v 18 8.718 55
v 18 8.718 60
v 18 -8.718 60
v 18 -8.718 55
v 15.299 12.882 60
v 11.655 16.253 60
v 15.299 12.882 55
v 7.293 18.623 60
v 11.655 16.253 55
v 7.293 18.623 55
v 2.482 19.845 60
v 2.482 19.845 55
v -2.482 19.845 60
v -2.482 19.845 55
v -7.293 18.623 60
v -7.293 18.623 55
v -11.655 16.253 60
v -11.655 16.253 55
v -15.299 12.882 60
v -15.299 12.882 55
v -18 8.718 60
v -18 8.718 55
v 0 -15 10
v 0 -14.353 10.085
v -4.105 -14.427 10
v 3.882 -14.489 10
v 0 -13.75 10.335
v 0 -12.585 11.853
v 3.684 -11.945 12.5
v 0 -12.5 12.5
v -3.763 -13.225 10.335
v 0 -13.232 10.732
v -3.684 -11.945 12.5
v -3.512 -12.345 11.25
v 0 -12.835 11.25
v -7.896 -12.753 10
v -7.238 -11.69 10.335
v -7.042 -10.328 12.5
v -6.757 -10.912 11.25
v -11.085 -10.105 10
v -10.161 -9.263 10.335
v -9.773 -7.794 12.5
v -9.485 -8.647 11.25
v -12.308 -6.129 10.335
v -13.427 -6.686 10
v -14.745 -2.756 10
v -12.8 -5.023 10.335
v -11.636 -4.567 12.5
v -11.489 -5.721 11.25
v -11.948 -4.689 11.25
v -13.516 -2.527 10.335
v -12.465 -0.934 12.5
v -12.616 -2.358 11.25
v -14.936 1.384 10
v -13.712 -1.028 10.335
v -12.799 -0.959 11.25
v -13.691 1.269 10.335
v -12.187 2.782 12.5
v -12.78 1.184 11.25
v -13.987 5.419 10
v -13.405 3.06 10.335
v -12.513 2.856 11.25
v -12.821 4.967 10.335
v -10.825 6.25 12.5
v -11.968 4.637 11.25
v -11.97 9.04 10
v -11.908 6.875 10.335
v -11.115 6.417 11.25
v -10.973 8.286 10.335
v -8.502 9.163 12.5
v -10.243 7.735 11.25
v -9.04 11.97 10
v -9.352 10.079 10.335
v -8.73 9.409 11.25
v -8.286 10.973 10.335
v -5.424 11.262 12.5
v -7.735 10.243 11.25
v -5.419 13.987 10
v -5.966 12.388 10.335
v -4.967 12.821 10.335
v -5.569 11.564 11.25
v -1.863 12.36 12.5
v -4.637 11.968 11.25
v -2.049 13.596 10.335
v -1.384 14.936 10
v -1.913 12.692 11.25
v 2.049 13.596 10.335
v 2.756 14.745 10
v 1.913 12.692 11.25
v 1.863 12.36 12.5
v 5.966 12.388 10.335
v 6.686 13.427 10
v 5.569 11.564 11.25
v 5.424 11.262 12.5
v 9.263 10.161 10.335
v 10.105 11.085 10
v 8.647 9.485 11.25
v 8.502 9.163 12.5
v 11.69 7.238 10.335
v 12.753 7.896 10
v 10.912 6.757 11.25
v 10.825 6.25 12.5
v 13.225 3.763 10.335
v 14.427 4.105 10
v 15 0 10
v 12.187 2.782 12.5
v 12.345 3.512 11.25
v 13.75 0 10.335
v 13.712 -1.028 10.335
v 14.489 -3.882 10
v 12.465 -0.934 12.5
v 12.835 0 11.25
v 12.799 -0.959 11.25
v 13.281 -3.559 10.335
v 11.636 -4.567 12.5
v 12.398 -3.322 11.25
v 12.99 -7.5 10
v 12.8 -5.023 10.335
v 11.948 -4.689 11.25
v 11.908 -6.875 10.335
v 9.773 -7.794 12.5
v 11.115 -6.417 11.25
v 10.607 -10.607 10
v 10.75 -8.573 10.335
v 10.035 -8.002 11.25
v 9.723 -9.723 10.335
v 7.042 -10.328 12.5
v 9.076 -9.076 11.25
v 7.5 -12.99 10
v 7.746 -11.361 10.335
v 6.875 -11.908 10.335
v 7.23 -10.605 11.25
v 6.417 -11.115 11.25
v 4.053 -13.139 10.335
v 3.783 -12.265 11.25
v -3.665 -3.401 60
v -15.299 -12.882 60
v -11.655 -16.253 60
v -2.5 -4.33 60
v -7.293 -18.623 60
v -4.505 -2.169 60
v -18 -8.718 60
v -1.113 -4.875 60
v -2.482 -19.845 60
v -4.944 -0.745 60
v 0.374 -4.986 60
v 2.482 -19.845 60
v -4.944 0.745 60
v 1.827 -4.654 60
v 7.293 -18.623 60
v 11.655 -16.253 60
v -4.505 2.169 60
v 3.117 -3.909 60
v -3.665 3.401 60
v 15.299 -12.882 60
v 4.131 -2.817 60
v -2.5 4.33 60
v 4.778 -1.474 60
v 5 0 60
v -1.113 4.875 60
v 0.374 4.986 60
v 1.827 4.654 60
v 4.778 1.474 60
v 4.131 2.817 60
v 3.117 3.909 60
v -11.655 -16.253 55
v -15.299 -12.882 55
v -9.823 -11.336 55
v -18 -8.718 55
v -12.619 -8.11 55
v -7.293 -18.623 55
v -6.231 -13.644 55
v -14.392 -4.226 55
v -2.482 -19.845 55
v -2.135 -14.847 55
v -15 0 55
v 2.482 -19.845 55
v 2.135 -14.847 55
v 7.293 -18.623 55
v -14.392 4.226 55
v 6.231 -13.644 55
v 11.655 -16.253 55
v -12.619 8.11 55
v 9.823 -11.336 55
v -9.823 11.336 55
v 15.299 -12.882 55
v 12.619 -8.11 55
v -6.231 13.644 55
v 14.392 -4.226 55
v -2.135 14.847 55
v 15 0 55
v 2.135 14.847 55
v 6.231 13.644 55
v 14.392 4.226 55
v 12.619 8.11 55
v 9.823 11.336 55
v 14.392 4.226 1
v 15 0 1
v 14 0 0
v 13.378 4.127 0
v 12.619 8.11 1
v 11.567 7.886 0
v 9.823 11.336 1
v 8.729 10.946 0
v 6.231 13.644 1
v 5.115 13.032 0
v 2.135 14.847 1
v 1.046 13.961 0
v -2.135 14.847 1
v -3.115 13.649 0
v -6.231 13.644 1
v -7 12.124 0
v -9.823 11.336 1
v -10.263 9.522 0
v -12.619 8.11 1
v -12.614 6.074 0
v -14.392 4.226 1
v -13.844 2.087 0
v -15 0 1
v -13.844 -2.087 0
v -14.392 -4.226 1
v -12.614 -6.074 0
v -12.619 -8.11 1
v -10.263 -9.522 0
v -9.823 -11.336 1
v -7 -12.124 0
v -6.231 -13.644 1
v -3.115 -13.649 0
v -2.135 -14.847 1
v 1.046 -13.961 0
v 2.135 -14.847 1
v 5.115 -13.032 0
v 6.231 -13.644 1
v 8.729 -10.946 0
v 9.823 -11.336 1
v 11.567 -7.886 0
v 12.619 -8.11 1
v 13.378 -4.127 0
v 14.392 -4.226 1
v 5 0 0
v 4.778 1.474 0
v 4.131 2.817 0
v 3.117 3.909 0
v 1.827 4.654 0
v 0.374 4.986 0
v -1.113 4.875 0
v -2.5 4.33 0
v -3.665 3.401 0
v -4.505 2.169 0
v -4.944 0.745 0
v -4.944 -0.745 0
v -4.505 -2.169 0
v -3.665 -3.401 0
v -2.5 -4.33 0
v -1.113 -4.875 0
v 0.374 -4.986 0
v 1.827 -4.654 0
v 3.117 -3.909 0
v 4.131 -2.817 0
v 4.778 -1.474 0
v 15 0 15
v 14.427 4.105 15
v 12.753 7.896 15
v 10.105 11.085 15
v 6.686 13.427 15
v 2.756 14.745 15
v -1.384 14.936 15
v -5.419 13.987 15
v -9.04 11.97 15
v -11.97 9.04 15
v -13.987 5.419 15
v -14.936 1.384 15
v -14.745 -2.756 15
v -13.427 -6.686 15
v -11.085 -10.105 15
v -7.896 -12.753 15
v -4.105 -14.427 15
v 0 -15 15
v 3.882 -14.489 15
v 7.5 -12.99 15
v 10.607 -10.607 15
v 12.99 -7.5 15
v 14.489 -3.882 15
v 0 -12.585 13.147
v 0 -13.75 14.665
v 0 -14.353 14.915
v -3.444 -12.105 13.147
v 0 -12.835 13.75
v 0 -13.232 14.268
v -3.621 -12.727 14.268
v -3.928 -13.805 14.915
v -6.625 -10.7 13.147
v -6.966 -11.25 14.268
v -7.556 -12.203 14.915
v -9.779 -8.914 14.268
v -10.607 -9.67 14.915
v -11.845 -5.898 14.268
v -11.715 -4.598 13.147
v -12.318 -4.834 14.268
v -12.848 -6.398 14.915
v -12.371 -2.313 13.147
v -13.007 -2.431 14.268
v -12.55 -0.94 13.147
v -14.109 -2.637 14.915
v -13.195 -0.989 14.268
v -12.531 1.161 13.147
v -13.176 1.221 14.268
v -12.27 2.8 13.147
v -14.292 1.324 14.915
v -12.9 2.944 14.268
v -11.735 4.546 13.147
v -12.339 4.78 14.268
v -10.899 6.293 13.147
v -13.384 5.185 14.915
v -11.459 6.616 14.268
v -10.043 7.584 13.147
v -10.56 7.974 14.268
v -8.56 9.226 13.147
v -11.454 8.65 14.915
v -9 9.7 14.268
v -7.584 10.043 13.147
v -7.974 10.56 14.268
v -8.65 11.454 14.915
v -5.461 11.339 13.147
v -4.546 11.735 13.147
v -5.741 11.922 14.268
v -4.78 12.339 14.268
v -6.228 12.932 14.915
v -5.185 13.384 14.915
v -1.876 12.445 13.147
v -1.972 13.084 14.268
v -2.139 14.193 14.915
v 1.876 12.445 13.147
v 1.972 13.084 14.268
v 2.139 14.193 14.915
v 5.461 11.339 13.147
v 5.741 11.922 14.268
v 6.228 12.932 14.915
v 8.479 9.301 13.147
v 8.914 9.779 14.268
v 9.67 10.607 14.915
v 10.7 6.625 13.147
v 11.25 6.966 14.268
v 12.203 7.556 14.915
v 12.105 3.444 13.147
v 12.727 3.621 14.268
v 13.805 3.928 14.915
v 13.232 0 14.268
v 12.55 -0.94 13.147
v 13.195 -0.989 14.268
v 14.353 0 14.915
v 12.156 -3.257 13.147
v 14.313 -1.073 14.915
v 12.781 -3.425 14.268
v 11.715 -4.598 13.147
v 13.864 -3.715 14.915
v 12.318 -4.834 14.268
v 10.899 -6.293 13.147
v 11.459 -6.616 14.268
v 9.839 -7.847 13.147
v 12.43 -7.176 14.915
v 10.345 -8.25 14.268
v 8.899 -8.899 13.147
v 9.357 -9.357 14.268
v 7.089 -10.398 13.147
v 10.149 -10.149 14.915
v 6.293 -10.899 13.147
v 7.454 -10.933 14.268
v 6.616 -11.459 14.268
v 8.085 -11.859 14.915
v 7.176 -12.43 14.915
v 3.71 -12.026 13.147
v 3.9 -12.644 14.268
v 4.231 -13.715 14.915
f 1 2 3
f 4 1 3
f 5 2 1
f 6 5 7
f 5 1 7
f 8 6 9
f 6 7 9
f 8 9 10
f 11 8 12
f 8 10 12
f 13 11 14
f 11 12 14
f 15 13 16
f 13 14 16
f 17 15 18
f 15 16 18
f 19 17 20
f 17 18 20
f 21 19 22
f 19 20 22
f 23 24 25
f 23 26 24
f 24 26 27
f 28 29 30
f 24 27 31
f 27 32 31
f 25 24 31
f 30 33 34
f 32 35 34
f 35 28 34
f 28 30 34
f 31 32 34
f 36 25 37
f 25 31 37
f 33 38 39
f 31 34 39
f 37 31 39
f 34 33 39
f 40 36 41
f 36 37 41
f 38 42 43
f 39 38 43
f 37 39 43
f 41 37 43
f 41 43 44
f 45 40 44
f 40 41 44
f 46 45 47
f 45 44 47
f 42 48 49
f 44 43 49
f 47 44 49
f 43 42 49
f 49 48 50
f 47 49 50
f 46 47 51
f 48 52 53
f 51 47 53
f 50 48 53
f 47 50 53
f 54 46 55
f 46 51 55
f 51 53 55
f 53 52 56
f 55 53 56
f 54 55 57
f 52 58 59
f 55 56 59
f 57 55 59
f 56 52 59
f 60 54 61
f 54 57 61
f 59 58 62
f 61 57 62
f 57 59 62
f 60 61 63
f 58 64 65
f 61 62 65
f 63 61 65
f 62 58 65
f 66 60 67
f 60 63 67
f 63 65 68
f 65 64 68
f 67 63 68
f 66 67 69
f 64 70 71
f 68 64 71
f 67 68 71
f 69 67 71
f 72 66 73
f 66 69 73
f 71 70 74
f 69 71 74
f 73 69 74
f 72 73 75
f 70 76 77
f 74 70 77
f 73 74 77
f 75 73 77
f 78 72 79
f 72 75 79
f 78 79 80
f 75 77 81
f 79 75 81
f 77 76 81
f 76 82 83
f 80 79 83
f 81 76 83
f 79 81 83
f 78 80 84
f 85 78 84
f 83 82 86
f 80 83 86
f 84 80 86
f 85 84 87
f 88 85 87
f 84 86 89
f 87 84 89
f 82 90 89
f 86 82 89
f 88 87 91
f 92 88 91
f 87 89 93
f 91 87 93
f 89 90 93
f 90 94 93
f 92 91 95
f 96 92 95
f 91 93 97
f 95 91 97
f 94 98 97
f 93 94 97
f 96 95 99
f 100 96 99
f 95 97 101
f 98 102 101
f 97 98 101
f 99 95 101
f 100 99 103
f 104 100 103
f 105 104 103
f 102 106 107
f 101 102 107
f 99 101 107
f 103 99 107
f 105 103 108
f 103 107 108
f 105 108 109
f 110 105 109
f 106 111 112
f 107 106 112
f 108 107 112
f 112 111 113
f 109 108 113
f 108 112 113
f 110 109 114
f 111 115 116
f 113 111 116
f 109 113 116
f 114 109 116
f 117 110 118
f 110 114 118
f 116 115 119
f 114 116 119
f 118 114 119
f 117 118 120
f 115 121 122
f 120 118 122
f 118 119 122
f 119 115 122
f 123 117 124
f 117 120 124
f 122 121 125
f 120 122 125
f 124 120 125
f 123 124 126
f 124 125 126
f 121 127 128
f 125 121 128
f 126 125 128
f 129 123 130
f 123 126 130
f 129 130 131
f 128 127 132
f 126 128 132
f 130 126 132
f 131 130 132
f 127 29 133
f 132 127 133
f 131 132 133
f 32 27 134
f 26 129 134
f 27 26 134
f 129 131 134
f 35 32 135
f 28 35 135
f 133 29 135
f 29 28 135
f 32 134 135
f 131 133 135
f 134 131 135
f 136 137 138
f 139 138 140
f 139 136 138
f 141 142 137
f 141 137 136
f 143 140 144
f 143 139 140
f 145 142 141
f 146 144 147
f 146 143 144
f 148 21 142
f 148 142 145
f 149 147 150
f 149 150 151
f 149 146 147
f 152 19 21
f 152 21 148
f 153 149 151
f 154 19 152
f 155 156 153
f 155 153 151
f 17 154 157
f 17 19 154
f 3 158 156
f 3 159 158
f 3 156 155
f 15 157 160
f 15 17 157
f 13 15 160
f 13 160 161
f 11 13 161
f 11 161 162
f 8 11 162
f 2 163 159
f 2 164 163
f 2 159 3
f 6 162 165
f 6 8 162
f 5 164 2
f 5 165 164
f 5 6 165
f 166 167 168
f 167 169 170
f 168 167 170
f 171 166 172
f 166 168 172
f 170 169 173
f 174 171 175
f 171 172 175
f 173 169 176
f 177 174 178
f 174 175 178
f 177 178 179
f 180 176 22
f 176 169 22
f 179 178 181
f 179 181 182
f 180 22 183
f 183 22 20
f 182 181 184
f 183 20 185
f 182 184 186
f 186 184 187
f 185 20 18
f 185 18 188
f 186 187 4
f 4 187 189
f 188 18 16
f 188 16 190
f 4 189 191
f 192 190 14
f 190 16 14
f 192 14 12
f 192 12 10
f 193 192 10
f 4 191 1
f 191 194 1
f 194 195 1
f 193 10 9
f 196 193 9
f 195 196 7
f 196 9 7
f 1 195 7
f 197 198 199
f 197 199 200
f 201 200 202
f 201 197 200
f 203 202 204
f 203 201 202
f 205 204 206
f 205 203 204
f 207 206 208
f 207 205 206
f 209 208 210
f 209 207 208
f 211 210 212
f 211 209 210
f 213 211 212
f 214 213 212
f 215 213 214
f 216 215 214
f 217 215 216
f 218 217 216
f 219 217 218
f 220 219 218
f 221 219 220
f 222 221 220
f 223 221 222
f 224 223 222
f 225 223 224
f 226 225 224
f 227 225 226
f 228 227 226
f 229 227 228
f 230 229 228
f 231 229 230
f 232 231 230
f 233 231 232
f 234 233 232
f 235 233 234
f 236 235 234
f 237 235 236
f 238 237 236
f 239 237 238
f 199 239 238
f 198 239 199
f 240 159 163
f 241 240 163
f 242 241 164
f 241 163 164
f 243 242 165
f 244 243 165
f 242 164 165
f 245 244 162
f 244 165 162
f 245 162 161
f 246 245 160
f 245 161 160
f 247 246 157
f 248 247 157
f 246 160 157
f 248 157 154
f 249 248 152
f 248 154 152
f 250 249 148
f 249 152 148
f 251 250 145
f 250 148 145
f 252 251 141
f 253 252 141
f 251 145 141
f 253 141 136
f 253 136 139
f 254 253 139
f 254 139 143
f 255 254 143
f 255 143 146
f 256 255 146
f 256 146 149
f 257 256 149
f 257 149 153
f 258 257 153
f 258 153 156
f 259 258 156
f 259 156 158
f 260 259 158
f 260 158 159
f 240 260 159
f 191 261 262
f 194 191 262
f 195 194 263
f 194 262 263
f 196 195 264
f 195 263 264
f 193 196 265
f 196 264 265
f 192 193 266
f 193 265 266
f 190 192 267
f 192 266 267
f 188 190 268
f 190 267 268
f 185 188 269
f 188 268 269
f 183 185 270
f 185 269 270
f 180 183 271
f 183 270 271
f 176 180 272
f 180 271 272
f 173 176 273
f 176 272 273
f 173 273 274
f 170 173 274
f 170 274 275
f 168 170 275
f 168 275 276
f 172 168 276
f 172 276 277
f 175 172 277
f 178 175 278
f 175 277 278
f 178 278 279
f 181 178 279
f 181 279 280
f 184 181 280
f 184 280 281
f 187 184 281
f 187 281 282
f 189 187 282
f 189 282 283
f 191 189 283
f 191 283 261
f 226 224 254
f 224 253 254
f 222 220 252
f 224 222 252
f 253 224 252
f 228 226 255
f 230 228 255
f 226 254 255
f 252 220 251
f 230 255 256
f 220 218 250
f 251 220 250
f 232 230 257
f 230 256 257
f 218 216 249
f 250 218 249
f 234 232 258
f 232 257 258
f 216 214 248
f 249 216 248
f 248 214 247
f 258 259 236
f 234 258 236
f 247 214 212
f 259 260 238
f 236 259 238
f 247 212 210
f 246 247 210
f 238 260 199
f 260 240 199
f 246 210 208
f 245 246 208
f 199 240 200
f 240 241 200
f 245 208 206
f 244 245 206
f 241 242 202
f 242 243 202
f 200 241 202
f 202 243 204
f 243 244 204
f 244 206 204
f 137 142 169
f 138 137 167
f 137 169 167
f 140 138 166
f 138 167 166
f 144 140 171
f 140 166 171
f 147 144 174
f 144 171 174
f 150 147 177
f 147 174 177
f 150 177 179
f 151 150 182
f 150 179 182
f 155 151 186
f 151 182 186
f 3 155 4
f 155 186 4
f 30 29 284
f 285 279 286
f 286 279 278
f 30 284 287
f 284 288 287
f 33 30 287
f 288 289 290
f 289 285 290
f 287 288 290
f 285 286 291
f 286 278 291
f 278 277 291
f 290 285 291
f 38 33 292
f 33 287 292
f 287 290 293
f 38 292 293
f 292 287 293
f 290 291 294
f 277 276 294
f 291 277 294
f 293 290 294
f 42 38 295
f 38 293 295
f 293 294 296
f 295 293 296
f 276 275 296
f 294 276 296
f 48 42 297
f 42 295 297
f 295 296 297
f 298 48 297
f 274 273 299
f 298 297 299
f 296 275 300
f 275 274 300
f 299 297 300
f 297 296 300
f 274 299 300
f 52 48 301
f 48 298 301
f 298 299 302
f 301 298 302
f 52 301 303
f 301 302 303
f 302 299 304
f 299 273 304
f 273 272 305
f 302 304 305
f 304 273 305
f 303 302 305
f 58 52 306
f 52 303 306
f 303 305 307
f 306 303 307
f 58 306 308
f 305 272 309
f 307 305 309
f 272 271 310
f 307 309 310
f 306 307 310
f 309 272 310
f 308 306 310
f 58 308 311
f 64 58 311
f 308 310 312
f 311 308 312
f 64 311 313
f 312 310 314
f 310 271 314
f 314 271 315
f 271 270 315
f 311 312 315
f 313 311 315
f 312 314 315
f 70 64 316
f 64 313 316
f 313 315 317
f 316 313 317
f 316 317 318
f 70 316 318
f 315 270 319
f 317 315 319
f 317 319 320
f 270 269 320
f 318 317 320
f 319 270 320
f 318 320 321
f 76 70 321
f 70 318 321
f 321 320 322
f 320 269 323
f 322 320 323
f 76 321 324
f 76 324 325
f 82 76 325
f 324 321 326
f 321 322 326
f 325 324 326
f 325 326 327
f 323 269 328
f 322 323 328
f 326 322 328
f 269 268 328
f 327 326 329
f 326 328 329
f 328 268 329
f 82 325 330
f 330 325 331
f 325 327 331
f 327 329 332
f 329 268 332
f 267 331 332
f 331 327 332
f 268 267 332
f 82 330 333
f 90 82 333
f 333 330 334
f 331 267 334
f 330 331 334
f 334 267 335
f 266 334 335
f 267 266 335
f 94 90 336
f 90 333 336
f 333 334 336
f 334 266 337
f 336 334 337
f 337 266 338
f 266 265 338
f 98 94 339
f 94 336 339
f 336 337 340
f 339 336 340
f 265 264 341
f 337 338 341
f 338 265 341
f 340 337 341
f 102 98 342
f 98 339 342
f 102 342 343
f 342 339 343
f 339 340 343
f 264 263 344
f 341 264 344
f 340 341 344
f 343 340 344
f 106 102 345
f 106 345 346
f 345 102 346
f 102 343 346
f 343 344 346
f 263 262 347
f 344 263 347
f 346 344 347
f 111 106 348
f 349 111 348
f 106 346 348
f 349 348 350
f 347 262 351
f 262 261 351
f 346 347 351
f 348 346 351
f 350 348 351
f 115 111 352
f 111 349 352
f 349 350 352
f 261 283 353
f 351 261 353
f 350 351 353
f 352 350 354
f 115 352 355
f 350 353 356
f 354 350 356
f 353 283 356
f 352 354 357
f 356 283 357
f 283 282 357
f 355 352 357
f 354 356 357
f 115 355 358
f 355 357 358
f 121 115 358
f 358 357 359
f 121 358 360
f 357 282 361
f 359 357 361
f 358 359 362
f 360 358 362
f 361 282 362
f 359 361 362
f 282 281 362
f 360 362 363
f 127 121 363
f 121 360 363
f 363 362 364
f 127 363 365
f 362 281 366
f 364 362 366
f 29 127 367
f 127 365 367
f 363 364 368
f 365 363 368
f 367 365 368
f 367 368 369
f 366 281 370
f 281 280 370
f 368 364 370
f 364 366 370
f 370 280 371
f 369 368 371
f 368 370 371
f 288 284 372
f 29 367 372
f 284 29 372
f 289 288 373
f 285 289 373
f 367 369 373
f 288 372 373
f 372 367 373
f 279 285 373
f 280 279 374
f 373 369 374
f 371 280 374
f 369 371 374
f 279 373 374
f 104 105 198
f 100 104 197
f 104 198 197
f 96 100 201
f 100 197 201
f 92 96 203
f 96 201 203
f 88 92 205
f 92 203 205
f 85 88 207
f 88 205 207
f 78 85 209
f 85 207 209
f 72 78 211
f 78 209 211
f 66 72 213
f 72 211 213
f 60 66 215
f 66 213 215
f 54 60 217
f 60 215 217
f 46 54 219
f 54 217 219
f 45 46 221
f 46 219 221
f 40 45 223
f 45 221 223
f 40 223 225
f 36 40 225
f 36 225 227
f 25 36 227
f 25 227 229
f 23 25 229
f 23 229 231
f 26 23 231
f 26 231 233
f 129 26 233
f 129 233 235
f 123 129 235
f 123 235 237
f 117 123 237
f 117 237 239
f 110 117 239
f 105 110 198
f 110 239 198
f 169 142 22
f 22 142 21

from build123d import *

# Parameters (mm, degrees)
F1_R     = 15
F2_DEPTH = 55
F3_R     = 20
F5_DEPTH = 5
F6_R     = 5
F7_DEPTH = 60.001
F9_DEPTH = 60.001
F10_R    = 2.5
F12_SIZE = 1


with BuildPart() as f2:
    # F1 (on Top) → F2 (new body)
    with BuildSketch(Plane.XY):
        Circle(F1_R)
    extrude(amount=F2_DEPTH)

    # F3 (on face) → F5 (join, through all)
    with BuildSketch(Plane.XY.offset(55)):
        Circle(F3_R)
    extrude(amount=F5_DEPTH)

    # F6 (on face) → F7 (cut, through all)
    with BuildSketch(Plane.XY.offset(60)):
        Circle(F6_R)
    extrude(amount=-F7_DEPTH, mode=Mode.SUBTRACT)

    # F8 (on face) → F9 (cut, through all)
    with BuildSketch(Plane.XY.offset(60)):
        with BuildLine():
            Line((-18, -8.7177978871), (-18, 0))
            Line((-18, 0), (-18, 8.7177978871))
            ThreePointArc((-18, 8.7177978871), (-20, 0), (-18, -8.7177978871))
        make_face()
        with BuildLine():
            Line((18, 8.7177978871), (18, 0))
            Line((18, 0), (18, -8.7177978871))
            ThreePointArc((18, -8.7177978871), (19.4935886896, -4.472135955), (20, 0))
            ThreePointArc((20, 0), (19.4935886896, 4.472135955), (18, 8.7177978871))
        make_face()
    extrude(amount=-F9_DEPTH, mode=Mode.SUBTRACT)

    # F10 (on Right) → F11 (revolve, cut)
    with BuildSketch(Plane.YZ):
        with Locations((-15, 12.5)):
            Circle(F10_R)
    revolve(axis=Axis((0, 0, 0), (0, 0, -1)), mode=Mode.SUBTRACT)

    # F12
    f12_edges = [f2.edges().sort_by_distance(p)[0] for p in [
        (-15, 0, 0),
    ]]
    chamfer(f12_edges, length=F12_SIZE)


solid = f2.part
